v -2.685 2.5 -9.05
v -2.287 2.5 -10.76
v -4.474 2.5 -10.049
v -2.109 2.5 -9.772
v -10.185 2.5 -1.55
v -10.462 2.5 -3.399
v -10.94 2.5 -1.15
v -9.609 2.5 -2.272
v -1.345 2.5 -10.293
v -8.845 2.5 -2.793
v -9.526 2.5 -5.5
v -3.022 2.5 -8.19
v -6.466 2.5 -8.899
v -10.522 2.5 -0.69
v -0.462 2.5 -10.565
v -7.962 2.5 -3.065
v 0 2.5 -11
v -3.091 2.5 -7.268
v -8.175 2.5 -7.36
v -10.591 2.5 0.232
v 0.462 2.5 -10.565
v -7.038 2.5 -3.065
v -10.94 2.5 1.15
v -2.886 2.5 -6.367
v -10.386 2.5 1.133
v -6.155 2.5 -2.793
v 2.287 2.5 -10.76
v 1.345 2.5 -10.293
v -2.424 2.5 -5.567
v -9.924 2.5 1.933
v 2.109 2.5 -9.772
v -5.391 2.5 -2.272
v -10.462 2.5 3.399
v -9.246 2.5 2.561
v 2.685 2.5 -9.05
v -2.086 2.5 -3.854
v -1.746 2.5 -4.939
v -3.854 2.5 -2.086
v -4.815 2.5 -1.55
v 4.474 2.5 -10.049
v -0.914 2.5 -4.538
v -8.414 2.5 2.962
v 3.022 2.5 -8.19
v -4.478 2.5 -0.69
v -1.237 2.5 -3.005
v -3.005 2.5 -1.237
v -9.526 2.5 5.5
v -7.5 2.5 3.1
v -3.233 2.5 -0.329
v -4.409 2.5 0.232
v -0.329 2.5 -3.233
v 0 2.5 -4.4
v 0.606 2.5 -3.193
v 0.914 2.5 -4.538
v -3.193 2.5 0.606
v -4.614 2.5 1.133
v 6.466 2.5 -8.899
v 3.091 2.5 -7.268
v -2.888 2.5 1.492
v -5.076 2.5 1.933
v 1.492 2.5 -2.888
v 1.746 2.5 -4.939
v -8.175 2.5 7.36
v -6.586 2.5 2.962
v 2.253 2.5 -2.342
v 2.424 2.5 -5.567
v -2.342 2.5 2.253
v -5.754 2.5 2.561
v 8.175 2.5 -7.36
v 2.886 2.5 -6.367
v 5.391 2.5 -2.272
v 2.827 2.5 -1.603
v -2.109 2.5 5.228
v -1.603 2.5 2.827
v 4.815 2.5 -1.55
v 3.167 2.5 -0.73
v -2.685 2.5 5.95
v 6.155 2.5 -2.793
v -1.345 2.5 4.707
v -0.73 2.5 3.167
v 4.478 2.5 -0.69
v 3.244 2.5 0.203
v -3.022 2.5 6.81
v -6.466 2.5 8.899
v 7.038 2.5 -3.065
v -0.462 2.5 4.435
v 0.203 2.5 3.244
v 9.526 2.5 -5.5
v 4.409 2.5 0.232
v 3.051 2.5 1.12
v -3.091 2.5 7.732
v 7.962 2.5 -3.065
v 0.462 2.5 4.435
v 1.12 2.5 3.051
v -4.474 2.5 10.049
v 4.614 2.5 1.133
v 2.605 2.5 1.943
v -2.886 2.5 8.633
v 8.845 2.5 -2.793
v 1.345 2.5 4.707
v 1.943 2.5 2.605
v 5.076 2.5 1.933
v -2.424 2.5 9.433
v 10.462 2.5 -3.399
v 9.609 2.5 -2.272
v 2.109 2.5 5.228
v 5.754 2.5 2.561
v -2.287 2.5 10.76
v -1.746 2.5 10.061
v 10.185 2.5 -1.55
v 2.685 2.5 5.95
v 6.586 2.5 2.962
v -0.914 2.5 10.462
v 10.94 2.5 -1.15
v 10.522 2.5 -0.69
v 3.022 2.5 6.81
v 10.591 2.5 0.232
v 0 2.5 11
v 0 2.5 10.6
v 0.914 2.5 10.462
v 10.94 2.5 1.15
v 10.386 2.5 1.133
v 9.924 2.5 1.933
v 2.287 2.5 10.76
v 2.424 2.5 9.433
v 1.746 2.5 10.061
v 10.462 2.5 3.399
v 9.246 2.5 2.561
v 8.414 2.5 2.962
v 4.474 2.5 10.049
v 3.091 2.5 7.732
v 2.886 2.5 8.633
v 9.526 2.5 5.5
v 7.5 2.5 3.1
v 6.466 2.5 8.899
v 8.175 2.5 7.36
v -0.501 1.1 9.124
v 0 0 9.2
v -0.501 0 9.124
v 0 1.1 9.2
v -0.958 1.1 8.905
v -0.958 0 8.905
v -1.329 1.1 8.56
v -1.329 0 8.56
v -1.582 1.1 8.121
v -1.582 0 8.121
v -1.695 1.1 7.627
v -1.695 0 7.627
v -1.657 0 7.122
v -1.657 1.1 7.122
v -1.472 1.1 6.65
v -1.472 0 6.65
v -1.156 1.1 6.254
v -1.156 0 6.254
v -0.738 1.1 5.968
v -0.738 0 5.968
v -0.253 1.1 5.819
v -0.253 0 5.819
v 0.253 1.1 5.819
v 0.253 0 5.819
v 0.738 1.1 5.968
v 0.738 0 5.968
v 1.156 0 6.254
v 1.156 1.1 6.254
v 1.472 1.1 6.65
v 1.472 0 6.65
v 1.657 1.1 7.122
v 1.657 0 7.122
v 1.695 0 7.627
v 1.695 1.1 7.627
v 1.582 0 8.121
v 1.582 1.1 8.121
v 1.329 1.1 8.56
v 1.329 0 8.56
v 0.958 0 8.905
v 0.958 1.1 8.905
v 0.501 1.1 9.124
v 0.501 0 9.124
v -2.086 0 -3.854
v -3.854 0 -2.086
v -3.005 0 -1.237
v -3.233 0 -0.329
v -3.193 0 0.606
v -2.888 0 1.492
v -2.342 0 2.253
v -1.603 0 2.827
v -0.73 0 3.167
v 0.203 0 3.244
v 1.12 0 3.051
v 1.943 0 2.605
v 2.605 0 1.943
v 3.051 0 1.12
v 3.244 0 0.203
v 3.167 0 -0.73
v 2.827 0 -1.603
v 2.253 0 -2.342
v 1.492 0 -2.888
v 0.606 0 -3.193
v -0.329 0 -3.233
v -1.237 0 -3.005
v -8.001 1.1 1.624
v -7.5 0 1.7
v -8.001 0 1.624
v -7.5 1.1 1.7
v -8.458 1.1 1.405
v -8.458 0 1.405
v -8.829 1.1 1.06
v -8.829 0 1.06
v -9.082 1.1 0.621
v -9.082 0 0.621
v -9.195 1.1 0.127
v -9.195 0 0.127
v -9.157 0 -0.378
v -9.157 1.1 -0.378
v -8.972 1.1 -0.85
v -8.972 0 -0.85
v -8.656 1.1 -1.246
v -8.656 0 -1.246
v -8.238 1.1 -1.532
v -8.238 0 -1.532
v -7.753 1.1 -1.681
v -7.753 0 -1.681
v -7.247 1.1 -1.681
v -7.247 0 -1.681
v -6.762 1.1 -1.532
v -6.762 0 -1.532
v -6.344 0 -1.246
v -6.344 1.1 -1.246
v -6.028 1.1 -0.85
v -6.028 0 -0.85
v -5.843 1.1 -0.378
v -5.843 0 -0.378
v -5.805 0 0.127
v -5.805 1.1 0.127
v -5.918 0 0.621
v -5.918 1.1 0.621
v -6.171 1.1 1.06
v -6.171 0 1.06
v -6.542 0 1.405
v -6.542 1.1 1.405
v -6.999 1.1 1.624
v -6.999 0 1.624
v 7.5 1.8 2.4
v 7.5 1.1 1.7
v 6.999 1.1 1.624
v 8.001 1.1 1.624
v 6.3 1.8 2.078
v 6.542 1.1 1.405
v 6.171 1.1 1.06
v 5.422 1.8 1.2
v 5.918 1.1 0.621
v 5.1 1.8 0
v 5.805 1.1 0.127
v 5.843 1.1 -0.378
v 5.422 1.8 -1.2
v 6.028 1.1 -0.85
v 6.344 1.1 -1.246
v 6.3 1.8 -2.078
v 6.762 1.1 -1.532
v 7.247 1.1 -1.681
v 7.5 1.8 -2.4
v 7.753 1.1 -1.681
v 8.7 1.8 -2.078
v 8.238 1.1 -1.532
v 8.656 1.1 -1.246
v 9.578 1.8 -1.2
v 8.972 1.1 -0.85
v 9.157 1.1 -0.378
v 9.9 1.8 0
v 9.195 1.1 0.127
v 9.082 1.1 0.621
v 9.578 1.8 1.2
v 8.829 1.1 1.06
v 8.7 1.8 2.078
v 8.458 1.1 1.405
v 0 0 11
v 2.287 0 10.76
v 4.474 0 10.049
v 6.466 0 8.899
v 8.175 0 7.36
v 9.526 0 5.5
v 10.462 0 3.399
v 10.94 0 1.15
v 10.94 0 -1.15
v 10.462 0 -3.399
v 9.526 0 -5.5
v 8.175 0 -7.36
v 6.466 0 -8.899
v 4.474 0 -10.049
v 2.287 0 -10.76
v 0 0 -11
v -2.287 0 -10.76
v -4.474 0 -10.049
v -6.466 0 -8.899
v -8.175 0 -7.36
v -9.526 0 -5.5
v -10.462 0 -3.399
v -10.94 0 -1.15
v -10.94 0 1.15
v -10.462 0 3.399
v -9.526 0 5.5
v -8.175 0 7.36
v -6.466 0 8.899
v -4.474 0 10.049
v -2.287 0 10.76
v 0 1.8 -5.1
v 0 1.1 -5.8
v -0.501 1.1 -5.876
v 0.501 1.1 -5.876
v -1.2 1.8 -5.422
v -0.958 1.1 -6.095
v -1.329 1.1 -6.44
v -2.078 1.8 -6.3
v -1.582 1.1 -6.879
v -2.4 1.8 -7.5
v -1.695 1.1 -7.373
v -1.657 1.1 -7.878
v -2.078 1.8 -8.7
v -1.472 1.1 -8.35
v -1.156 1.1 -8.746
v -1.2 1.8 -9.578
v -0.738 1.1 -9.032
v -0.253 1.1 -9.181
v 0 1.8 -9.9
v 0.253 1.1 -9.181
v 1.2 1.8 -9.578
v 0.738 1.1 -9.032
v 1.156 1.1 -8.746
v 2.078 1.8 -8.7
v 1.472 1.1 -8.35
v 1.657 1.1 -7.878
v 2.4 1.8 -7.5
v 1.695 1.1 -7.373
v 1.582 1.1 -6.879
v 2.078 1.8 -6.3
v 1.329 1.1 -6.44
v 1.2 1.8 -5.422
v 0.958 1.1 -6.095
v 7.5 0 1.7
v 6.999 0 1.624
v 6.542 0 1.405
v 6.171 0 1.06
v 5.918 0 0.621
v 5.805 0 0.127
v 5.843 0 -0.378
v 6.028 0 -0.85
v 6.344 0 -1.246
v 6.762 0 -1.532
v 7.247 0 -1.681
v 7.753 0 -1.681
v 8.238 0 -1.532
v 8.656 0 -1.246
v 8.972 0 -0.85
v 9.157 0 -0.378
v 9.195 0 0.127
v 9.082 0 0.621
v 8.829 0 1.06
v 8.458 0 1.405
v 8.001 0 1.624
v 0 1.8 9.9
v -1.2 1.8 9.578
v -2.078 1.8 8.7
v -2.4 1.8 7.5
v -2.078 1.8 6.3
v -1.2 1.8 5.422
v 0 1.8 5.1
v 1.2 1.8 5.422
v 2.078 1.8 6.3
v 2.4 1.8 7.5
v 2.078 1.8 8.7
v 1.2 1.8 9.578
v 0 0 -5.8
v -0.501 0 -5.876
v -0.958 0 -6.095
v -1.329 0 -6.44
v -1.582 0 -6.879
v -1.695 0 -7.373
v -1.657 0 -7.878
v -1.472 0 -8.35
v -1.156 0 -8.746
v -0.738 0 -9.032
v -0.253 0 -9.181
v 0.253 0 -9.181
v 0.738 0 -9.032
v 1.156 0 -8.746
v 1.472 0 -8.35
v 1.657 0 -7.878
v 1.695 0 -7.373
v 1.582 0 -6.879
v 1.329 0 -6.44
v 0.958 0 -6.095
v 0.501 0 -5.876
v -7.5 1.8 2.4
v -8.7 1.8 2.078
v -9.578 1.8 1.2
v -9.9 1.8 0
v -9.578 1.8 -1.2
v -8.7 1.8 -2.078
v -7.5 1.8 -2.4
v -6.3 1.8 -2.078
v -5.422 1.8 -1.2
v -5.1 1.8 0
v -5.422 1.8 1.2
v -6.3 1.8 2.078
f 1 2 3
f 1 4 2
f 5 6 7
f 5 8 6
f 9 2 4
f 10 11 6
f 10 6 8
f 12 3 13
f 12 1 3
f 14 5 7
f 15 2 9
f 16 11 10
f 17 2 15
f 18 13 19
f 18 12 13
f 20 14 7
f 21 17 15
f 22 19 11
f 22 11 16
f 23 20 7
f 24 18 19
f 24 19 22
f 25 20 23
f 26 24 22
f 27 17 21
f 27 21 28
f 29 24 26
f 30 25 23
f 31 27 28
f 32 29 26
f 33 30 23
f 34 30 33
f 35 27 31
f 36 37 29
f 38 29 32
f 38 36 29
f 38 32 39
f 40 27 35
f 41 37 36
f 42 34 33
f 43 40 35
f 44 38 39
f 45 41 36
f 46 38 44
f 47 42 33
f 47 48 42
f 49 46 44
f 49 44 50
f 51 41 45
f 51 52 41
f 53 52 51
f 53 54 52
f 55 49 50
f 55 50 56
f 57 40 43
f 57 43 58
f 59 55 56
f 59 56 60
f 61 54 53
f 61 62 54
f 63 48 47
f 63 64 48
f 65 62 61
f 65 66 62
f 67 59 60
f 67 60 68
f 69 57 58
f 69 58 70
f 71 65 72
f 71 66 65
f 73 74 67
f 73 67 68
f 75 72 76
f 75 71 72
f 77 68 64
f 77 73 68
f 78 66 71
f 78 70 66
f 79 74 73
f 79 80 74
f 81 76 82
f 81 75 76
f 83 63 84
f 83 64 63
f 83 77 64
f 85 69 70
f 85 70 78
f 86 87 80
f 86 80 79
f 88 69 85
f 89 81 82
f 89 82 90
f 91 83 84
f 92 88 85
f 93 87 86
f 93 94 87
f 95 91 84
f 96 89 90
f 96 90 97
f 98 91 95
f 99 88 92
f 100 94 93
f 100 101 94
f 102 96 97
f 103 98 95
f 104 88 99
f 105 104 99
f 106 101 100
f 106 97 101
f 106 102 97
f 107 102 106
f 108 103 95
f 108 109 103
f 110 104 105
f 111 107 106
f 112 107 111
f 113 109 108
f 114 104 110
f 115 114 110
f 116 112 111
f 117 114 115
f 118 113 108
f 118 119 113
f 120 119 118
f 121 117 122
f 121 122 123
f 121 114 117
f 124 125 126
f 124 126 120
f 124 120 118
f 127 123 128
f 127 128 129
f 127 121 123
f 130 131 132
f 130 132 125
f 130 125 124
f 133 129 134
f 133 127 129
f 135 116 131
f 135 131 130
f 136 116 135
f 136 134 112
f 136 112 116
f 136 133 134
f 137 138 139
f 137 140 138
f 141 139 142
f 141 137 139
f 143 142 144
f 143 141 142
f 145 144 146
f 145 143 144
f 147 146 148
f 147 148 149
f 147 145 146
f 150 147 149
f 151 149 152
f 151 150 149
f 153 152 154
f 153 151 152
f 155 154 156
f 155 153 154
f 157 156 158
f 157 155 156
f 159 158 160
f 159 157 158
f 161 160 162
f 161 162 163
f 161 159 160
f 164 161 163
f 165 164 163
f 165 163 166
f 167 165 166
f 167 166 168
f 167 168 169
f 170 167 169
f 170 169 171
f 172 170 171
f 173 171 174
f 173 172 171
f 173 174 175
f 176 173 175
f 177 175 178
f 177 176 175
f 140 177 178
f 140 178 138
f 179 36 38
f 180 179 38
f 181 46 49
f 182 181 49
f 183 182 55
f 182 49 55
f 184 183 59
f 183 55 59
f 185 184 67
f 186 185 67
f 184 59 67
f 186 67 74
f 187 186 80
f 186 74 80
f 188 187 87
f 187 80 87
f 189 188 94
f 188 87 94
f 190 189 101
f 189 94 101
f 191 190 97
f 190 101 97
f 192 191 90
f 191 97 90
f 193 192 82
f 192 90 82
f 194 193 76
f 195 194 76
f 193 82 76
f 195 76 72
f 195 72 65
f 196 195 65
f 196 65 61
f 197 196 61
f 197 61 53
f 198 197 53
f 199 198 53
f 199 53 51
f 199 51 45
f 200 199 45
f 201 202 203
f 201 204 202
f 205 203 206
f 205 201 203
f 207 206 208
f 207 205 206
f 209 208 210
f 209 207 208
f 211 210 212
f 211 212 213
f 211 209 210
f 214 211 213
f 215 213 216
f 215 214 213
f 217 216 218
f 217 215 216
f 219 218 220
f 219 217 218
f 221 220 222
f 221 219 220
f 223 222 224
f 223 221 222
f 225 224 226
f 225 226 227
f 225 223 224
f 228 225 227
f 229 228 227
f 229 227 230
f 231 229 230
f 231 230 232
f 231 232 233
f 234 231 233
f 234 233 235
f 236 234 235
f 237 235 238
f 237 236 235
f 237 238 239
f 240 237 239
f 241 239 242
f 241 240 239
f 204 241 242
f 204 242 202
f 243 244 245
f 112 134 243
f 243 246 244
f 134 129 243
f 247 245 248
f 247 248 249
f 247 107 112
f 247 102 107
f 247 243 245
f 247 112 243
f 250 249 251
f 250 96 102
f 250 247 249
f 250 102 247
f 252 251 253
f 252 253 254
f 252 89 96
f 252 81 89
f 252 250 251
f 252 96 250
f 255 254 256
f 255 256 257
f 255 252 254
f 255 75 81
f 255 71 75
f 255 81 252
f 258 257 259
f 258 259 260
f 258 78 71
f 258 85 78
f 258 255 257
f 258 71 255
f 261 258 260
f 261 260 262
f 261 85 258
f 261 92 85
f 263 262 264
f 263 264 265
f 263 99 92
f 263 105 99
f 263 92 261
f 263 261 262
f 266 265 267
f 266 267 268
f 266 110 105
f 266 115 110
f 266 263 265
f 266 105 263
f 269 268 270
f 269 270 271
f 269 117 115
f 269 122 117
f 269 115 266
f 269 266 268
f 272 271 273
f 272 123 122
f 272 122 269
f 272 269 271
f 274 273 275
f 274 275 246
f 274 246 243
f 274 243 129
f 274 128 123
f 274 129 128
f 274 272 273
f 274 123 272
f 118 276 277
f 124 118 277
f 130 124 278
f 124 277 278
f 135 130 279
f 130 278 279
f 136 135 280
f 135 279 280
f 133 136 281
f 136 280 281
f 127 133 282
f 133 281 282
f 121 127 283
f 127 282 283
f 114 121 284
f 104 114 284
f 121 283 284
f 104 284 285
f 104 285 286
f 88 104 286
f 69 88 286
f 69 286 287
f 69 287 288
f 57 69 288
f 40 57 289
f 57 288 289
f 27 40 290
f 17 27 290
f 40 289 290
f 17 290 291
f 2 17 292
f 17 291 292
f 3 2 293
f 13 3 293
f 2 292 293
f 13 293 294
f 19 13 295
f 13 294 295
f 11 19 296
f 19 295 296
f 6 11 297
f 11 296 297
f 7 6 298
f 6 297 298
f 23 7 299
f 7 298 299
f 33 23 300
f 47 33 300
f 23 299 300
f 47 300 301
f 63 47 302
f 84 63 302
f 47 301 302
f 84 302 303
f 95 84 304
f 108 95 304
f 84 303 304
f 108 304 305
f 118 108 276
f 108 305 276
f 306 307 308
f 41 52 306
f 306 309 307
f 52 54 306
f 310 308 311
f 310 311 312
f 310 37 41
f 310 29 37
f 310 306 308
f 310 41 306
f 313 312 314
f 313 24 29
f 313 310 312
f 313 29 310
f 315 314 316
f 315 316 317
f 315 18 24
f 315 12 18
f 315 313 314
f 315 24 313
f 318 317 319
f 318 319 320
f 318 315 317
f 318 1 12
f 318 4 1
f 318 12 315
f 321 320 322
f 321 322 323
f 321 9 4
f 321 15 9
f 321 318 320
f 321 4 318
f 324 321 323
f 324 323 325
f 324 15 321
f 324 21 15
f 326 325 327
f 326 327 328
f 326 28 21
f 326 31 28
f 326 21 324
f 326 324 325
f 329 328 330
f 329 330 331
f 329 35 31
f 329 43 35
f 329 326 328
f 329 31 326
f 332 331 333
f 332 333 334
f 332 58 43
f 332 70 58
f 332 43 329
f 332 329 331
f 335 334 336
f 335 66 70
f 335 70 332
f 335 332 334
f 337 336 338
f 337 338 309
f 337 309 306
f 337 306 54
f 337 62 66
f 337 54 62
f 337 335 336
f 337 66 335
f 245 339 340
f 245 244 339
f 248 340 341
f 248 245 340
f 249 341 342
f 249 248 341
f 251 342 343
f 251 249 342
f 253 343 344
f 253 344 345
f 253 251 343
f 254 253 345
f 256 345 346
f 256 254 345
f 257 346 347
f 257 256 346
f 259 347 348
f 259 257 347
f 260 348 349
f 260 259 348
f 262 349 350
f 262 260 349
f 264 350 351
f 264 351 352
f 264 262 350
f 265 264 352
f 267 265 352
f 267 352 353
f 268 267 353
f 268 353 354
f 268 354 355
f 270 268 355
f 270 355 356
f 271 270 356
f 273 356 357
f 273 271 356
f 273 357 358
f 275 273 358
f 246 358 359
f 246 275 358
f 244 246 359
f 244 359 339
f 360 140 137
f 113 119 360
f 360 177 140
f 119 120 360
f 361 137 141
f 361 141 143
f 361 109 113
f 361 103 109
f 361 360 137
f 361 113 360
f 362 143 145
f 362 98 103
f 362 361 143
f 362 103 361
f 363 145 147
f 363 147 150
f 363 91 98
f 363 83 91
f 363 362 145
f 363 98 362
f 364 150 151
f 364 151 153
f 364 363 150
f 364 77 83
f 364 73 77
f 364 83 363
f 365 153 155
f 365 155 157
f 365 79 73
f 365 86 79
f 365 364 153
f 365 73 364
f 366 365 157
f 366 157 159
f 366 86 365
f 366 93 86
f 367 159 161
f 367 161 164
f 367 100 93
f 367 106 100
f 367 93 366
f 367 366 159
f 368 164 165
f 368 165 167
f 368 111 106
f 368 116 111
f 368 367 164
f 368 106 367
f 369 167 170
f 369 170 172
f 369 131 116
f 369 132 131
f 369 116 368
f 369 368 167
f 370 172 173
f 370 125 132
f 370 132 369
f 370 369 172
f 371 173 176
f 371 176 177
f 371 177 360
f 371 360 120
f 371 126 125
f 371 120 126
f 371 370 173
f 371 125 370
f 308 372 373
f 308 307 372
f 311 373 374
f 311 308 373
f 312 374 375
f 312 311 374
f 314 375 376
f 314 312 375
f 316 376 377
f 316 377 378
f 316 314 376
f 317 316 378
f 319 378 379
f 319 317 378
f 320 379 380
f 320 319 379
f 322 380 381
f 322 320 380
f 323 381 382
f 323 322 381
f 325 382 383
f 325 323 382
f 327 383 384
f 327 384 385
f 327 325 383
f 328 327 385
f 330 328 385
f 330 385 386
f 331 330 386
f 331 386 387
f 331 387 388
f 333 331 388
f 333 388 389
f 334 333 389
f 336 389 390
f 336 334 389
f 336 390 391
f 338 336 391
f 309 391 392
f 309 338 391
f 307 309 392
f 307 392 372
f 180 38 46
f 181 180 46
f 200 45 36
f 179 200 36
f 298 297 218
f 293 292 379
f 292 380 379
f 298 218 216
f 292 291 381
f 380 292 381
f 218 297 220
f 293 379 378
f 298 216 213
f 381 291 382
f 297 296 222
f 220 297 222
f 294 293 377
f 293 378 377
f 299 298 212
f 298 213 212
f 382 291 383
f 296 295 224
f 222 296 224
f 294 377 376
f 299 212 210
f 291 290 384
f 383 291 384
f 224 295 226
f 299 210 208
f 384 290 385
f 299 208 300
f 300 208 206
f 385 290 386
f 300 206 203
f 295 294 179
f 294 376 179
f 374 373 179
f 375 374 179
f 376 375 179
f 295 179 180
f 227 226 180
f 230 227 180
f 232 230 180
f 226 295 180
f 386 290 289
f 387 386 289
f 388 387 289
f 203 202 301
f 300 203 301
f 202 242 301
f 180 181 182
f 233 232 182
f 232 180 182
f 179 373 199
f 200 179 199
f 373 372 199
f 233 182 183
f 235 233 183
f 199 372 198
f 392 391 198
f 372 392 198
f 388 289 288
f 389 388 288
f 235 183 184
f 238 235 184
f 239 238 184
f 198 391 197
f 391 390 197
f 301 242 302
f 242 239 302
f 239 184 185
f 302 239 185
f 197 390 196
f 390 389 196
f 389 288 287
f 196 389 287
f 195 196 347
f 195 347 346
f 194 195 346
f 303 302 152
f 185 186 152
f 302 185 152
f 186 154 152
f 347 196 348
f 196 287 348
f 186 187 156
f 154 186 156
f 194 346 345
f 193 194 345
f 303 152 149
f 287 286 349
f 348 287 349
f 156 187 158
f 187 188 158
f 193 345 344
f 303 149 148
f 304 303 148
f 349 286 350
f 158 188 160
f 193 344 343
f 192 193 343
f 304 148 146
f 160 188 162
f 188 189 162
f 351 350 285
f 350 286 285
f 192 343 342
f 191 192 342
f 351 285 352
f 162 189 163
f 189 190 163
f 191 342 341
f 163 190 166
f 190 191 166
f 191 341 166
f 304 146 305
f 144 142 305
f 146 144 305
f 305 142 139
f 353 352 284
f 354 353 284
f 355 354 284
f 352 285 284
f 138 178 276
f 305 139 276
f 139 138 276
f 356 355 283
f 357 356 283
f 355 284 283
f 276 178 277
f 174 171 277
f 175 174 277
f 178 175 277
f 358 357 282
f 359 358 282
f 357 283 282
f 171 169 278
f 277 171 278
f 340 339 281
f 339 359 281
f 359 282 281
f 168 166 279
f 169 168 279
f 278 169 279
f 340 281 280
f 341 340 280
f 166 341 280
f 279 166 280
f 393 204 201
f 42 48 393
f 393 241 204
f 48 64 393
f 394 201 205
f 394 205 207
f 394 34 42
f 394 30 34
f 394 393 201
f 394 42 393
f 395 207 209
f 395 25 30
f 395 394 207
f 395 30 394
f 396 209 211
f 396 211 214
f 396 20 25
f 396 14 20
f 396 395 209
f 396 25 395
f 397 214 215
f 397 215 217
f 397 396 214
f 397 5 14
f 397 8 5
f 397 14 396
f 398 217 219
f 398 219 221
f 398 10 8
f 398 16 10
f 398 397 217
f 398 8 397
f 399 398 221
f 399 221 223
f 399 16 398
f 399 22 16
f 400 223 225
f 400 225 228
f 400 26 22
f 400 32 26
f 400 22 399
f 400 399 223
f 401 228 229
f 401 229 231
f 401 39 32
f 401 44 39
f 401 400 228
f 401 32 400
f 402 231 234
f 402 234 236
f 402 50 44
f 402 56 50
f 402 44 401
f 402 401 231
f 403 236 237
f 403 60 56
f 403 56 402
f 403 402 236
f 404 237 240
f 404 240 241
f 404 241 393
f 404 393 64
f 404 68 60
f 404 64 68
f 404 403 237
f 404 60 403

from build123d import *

# Parameters (mm, degrees)
SKETCH1_R                                    = 11
BOSS_EXTRUDE1_DEPTH                          = 2.5
CSK_FOR_M3_SOCKET_COUNTERSUNK_HEAD_S_2_COUNT = 2
CSK_FOR_M3_SOCKET_COUNTERSUNK_HEAD_S_2_PITCH = 10.606601718
CSK_FOR_M3_SOCKET_COUNTERSUNK_HEAD_S_3_COUNT = 2
CSK_FOR_M3_SOCKET_COUNTERSUNK_HEAD_S_3_PITCH = 15
CSK_FOR_M3_SOCKET_COUNTERSUNK_HEAD_S_4_COUNT = 2
CSK_FOR_M3_SOCKET_COUNTERSUNK_HEAD_S_4_PITCH = 10.606601718
CUT_EXTRUDE1_DEPTH                           = 16.755951257


with BuildPart() as part:
    # Sketch1 → Boss-Extrude1 (new body)
    with BuildSketch(Plane(origin=(0, 0, 0), x_dir=(1, 0, 0), z_dir=(0, 1, 0))):
        with Locations(Location((0, 0, 0), (0, 0, 270))):
            Circle(SKETCH1_R)
    extrude(amount=BOSS_EXTRUDE1_DEPTH)

    # Sketch3 → CSK for M3 socket countersunk head screw1 (revolve, cut)
    with BuildSketch(Plane(origin=(-7.5, 2.5, 0), x_dir=(0, 0, 1), z_dir=(1, 0, 0))):
        Polygon((0, 0), (0, 2.5), (1.7, 2.5), (1.7, 1.4), (3.1, 0), align=None)
    csk_for_m3_socket_countersunk_head_screw = revolve(axis=Axis((-7.5, 8.85, 0), (0, -1, 0)), mode=Mode.SUBTRACT)

    # CSK for M3 socket countersunk head s 2: CSK for M3 socket countersunk head screw1 ×2
    with Locations(*[Vector(0.7071067811865303, 0, -0.7071067811865648) * (i * CSK_FOR_M3_SOCKET_COUNTERSUNK_HEAD_S_2_PITCH) for i in range(1, CSK_FOR_M3_SOCKET_COUNTERSUNK_HEAD_S_2_COUNT)]):
        add(csk_for_m3_socket_countersunk_head_screw, mode=Mode.SUBTRACT)

    # CSK for M3 socket countersunk head s 3: CSK for M3 socket countersunk head screw1 ×2
    with Locations(*[(i * CSK_FOR_M3_SOCKET_COUNTERSUNK_HEAD_S_3_PITCH, 0, 0) for i in range(1, CSK_FOR_M3_SOCKET_COUNTERSUNK_HEAD_S_3_COUNT)]):
        add(csk_for_m3_socket_countersunk_head_screw, mode=Mode.SUBTRACT)

    # CSK for M3 socket countersunk head s 4: CSK for M3 socket countersunk head screw1 ×2
    with Locations(*[Vector(0.7071067811865648, 0, 0.7071067811865303) * (i * CSK_FOR_M3_SOCKET_COUNTERSUNK_HEAD_S_4_PITCH) for i in range(1, CSK_FOR_M3_SOCKET_COUNTERSUNK_HEAD_S_4_COUNT)]):
        add(csk_for_m3_socket_countersunk_head_screw, mode=Mode.SUBTRACT)

    # Sketch4 → Cut-Extrude1 (cut, through all)
    with BuildSketch(Plane(origin=(0, 2.5, 0), x_dir=(1, 0, 0), z_dir=(0, 1, 0))):
        with BuildLine():
            Line((-2.085965005, 3.853731957), (-3.853731957, 2.085965005))
            Line((-3.853731957, 2.085965005), (-3.00520382, 1.237436867))
            ThreePointArc((-3.00520382, 1.237436867), (2.298097039, -2.298097039), (-1.237436867, 3.00520382))
            Line((-1.237436867, 3.00520382), (-2.085965005, 3.853731957))
        make_face()
    extrude(amount=-CUT_EXTRUDE1_DEPTH, mode=Mode.SUBTRACT)


solid = part.part
